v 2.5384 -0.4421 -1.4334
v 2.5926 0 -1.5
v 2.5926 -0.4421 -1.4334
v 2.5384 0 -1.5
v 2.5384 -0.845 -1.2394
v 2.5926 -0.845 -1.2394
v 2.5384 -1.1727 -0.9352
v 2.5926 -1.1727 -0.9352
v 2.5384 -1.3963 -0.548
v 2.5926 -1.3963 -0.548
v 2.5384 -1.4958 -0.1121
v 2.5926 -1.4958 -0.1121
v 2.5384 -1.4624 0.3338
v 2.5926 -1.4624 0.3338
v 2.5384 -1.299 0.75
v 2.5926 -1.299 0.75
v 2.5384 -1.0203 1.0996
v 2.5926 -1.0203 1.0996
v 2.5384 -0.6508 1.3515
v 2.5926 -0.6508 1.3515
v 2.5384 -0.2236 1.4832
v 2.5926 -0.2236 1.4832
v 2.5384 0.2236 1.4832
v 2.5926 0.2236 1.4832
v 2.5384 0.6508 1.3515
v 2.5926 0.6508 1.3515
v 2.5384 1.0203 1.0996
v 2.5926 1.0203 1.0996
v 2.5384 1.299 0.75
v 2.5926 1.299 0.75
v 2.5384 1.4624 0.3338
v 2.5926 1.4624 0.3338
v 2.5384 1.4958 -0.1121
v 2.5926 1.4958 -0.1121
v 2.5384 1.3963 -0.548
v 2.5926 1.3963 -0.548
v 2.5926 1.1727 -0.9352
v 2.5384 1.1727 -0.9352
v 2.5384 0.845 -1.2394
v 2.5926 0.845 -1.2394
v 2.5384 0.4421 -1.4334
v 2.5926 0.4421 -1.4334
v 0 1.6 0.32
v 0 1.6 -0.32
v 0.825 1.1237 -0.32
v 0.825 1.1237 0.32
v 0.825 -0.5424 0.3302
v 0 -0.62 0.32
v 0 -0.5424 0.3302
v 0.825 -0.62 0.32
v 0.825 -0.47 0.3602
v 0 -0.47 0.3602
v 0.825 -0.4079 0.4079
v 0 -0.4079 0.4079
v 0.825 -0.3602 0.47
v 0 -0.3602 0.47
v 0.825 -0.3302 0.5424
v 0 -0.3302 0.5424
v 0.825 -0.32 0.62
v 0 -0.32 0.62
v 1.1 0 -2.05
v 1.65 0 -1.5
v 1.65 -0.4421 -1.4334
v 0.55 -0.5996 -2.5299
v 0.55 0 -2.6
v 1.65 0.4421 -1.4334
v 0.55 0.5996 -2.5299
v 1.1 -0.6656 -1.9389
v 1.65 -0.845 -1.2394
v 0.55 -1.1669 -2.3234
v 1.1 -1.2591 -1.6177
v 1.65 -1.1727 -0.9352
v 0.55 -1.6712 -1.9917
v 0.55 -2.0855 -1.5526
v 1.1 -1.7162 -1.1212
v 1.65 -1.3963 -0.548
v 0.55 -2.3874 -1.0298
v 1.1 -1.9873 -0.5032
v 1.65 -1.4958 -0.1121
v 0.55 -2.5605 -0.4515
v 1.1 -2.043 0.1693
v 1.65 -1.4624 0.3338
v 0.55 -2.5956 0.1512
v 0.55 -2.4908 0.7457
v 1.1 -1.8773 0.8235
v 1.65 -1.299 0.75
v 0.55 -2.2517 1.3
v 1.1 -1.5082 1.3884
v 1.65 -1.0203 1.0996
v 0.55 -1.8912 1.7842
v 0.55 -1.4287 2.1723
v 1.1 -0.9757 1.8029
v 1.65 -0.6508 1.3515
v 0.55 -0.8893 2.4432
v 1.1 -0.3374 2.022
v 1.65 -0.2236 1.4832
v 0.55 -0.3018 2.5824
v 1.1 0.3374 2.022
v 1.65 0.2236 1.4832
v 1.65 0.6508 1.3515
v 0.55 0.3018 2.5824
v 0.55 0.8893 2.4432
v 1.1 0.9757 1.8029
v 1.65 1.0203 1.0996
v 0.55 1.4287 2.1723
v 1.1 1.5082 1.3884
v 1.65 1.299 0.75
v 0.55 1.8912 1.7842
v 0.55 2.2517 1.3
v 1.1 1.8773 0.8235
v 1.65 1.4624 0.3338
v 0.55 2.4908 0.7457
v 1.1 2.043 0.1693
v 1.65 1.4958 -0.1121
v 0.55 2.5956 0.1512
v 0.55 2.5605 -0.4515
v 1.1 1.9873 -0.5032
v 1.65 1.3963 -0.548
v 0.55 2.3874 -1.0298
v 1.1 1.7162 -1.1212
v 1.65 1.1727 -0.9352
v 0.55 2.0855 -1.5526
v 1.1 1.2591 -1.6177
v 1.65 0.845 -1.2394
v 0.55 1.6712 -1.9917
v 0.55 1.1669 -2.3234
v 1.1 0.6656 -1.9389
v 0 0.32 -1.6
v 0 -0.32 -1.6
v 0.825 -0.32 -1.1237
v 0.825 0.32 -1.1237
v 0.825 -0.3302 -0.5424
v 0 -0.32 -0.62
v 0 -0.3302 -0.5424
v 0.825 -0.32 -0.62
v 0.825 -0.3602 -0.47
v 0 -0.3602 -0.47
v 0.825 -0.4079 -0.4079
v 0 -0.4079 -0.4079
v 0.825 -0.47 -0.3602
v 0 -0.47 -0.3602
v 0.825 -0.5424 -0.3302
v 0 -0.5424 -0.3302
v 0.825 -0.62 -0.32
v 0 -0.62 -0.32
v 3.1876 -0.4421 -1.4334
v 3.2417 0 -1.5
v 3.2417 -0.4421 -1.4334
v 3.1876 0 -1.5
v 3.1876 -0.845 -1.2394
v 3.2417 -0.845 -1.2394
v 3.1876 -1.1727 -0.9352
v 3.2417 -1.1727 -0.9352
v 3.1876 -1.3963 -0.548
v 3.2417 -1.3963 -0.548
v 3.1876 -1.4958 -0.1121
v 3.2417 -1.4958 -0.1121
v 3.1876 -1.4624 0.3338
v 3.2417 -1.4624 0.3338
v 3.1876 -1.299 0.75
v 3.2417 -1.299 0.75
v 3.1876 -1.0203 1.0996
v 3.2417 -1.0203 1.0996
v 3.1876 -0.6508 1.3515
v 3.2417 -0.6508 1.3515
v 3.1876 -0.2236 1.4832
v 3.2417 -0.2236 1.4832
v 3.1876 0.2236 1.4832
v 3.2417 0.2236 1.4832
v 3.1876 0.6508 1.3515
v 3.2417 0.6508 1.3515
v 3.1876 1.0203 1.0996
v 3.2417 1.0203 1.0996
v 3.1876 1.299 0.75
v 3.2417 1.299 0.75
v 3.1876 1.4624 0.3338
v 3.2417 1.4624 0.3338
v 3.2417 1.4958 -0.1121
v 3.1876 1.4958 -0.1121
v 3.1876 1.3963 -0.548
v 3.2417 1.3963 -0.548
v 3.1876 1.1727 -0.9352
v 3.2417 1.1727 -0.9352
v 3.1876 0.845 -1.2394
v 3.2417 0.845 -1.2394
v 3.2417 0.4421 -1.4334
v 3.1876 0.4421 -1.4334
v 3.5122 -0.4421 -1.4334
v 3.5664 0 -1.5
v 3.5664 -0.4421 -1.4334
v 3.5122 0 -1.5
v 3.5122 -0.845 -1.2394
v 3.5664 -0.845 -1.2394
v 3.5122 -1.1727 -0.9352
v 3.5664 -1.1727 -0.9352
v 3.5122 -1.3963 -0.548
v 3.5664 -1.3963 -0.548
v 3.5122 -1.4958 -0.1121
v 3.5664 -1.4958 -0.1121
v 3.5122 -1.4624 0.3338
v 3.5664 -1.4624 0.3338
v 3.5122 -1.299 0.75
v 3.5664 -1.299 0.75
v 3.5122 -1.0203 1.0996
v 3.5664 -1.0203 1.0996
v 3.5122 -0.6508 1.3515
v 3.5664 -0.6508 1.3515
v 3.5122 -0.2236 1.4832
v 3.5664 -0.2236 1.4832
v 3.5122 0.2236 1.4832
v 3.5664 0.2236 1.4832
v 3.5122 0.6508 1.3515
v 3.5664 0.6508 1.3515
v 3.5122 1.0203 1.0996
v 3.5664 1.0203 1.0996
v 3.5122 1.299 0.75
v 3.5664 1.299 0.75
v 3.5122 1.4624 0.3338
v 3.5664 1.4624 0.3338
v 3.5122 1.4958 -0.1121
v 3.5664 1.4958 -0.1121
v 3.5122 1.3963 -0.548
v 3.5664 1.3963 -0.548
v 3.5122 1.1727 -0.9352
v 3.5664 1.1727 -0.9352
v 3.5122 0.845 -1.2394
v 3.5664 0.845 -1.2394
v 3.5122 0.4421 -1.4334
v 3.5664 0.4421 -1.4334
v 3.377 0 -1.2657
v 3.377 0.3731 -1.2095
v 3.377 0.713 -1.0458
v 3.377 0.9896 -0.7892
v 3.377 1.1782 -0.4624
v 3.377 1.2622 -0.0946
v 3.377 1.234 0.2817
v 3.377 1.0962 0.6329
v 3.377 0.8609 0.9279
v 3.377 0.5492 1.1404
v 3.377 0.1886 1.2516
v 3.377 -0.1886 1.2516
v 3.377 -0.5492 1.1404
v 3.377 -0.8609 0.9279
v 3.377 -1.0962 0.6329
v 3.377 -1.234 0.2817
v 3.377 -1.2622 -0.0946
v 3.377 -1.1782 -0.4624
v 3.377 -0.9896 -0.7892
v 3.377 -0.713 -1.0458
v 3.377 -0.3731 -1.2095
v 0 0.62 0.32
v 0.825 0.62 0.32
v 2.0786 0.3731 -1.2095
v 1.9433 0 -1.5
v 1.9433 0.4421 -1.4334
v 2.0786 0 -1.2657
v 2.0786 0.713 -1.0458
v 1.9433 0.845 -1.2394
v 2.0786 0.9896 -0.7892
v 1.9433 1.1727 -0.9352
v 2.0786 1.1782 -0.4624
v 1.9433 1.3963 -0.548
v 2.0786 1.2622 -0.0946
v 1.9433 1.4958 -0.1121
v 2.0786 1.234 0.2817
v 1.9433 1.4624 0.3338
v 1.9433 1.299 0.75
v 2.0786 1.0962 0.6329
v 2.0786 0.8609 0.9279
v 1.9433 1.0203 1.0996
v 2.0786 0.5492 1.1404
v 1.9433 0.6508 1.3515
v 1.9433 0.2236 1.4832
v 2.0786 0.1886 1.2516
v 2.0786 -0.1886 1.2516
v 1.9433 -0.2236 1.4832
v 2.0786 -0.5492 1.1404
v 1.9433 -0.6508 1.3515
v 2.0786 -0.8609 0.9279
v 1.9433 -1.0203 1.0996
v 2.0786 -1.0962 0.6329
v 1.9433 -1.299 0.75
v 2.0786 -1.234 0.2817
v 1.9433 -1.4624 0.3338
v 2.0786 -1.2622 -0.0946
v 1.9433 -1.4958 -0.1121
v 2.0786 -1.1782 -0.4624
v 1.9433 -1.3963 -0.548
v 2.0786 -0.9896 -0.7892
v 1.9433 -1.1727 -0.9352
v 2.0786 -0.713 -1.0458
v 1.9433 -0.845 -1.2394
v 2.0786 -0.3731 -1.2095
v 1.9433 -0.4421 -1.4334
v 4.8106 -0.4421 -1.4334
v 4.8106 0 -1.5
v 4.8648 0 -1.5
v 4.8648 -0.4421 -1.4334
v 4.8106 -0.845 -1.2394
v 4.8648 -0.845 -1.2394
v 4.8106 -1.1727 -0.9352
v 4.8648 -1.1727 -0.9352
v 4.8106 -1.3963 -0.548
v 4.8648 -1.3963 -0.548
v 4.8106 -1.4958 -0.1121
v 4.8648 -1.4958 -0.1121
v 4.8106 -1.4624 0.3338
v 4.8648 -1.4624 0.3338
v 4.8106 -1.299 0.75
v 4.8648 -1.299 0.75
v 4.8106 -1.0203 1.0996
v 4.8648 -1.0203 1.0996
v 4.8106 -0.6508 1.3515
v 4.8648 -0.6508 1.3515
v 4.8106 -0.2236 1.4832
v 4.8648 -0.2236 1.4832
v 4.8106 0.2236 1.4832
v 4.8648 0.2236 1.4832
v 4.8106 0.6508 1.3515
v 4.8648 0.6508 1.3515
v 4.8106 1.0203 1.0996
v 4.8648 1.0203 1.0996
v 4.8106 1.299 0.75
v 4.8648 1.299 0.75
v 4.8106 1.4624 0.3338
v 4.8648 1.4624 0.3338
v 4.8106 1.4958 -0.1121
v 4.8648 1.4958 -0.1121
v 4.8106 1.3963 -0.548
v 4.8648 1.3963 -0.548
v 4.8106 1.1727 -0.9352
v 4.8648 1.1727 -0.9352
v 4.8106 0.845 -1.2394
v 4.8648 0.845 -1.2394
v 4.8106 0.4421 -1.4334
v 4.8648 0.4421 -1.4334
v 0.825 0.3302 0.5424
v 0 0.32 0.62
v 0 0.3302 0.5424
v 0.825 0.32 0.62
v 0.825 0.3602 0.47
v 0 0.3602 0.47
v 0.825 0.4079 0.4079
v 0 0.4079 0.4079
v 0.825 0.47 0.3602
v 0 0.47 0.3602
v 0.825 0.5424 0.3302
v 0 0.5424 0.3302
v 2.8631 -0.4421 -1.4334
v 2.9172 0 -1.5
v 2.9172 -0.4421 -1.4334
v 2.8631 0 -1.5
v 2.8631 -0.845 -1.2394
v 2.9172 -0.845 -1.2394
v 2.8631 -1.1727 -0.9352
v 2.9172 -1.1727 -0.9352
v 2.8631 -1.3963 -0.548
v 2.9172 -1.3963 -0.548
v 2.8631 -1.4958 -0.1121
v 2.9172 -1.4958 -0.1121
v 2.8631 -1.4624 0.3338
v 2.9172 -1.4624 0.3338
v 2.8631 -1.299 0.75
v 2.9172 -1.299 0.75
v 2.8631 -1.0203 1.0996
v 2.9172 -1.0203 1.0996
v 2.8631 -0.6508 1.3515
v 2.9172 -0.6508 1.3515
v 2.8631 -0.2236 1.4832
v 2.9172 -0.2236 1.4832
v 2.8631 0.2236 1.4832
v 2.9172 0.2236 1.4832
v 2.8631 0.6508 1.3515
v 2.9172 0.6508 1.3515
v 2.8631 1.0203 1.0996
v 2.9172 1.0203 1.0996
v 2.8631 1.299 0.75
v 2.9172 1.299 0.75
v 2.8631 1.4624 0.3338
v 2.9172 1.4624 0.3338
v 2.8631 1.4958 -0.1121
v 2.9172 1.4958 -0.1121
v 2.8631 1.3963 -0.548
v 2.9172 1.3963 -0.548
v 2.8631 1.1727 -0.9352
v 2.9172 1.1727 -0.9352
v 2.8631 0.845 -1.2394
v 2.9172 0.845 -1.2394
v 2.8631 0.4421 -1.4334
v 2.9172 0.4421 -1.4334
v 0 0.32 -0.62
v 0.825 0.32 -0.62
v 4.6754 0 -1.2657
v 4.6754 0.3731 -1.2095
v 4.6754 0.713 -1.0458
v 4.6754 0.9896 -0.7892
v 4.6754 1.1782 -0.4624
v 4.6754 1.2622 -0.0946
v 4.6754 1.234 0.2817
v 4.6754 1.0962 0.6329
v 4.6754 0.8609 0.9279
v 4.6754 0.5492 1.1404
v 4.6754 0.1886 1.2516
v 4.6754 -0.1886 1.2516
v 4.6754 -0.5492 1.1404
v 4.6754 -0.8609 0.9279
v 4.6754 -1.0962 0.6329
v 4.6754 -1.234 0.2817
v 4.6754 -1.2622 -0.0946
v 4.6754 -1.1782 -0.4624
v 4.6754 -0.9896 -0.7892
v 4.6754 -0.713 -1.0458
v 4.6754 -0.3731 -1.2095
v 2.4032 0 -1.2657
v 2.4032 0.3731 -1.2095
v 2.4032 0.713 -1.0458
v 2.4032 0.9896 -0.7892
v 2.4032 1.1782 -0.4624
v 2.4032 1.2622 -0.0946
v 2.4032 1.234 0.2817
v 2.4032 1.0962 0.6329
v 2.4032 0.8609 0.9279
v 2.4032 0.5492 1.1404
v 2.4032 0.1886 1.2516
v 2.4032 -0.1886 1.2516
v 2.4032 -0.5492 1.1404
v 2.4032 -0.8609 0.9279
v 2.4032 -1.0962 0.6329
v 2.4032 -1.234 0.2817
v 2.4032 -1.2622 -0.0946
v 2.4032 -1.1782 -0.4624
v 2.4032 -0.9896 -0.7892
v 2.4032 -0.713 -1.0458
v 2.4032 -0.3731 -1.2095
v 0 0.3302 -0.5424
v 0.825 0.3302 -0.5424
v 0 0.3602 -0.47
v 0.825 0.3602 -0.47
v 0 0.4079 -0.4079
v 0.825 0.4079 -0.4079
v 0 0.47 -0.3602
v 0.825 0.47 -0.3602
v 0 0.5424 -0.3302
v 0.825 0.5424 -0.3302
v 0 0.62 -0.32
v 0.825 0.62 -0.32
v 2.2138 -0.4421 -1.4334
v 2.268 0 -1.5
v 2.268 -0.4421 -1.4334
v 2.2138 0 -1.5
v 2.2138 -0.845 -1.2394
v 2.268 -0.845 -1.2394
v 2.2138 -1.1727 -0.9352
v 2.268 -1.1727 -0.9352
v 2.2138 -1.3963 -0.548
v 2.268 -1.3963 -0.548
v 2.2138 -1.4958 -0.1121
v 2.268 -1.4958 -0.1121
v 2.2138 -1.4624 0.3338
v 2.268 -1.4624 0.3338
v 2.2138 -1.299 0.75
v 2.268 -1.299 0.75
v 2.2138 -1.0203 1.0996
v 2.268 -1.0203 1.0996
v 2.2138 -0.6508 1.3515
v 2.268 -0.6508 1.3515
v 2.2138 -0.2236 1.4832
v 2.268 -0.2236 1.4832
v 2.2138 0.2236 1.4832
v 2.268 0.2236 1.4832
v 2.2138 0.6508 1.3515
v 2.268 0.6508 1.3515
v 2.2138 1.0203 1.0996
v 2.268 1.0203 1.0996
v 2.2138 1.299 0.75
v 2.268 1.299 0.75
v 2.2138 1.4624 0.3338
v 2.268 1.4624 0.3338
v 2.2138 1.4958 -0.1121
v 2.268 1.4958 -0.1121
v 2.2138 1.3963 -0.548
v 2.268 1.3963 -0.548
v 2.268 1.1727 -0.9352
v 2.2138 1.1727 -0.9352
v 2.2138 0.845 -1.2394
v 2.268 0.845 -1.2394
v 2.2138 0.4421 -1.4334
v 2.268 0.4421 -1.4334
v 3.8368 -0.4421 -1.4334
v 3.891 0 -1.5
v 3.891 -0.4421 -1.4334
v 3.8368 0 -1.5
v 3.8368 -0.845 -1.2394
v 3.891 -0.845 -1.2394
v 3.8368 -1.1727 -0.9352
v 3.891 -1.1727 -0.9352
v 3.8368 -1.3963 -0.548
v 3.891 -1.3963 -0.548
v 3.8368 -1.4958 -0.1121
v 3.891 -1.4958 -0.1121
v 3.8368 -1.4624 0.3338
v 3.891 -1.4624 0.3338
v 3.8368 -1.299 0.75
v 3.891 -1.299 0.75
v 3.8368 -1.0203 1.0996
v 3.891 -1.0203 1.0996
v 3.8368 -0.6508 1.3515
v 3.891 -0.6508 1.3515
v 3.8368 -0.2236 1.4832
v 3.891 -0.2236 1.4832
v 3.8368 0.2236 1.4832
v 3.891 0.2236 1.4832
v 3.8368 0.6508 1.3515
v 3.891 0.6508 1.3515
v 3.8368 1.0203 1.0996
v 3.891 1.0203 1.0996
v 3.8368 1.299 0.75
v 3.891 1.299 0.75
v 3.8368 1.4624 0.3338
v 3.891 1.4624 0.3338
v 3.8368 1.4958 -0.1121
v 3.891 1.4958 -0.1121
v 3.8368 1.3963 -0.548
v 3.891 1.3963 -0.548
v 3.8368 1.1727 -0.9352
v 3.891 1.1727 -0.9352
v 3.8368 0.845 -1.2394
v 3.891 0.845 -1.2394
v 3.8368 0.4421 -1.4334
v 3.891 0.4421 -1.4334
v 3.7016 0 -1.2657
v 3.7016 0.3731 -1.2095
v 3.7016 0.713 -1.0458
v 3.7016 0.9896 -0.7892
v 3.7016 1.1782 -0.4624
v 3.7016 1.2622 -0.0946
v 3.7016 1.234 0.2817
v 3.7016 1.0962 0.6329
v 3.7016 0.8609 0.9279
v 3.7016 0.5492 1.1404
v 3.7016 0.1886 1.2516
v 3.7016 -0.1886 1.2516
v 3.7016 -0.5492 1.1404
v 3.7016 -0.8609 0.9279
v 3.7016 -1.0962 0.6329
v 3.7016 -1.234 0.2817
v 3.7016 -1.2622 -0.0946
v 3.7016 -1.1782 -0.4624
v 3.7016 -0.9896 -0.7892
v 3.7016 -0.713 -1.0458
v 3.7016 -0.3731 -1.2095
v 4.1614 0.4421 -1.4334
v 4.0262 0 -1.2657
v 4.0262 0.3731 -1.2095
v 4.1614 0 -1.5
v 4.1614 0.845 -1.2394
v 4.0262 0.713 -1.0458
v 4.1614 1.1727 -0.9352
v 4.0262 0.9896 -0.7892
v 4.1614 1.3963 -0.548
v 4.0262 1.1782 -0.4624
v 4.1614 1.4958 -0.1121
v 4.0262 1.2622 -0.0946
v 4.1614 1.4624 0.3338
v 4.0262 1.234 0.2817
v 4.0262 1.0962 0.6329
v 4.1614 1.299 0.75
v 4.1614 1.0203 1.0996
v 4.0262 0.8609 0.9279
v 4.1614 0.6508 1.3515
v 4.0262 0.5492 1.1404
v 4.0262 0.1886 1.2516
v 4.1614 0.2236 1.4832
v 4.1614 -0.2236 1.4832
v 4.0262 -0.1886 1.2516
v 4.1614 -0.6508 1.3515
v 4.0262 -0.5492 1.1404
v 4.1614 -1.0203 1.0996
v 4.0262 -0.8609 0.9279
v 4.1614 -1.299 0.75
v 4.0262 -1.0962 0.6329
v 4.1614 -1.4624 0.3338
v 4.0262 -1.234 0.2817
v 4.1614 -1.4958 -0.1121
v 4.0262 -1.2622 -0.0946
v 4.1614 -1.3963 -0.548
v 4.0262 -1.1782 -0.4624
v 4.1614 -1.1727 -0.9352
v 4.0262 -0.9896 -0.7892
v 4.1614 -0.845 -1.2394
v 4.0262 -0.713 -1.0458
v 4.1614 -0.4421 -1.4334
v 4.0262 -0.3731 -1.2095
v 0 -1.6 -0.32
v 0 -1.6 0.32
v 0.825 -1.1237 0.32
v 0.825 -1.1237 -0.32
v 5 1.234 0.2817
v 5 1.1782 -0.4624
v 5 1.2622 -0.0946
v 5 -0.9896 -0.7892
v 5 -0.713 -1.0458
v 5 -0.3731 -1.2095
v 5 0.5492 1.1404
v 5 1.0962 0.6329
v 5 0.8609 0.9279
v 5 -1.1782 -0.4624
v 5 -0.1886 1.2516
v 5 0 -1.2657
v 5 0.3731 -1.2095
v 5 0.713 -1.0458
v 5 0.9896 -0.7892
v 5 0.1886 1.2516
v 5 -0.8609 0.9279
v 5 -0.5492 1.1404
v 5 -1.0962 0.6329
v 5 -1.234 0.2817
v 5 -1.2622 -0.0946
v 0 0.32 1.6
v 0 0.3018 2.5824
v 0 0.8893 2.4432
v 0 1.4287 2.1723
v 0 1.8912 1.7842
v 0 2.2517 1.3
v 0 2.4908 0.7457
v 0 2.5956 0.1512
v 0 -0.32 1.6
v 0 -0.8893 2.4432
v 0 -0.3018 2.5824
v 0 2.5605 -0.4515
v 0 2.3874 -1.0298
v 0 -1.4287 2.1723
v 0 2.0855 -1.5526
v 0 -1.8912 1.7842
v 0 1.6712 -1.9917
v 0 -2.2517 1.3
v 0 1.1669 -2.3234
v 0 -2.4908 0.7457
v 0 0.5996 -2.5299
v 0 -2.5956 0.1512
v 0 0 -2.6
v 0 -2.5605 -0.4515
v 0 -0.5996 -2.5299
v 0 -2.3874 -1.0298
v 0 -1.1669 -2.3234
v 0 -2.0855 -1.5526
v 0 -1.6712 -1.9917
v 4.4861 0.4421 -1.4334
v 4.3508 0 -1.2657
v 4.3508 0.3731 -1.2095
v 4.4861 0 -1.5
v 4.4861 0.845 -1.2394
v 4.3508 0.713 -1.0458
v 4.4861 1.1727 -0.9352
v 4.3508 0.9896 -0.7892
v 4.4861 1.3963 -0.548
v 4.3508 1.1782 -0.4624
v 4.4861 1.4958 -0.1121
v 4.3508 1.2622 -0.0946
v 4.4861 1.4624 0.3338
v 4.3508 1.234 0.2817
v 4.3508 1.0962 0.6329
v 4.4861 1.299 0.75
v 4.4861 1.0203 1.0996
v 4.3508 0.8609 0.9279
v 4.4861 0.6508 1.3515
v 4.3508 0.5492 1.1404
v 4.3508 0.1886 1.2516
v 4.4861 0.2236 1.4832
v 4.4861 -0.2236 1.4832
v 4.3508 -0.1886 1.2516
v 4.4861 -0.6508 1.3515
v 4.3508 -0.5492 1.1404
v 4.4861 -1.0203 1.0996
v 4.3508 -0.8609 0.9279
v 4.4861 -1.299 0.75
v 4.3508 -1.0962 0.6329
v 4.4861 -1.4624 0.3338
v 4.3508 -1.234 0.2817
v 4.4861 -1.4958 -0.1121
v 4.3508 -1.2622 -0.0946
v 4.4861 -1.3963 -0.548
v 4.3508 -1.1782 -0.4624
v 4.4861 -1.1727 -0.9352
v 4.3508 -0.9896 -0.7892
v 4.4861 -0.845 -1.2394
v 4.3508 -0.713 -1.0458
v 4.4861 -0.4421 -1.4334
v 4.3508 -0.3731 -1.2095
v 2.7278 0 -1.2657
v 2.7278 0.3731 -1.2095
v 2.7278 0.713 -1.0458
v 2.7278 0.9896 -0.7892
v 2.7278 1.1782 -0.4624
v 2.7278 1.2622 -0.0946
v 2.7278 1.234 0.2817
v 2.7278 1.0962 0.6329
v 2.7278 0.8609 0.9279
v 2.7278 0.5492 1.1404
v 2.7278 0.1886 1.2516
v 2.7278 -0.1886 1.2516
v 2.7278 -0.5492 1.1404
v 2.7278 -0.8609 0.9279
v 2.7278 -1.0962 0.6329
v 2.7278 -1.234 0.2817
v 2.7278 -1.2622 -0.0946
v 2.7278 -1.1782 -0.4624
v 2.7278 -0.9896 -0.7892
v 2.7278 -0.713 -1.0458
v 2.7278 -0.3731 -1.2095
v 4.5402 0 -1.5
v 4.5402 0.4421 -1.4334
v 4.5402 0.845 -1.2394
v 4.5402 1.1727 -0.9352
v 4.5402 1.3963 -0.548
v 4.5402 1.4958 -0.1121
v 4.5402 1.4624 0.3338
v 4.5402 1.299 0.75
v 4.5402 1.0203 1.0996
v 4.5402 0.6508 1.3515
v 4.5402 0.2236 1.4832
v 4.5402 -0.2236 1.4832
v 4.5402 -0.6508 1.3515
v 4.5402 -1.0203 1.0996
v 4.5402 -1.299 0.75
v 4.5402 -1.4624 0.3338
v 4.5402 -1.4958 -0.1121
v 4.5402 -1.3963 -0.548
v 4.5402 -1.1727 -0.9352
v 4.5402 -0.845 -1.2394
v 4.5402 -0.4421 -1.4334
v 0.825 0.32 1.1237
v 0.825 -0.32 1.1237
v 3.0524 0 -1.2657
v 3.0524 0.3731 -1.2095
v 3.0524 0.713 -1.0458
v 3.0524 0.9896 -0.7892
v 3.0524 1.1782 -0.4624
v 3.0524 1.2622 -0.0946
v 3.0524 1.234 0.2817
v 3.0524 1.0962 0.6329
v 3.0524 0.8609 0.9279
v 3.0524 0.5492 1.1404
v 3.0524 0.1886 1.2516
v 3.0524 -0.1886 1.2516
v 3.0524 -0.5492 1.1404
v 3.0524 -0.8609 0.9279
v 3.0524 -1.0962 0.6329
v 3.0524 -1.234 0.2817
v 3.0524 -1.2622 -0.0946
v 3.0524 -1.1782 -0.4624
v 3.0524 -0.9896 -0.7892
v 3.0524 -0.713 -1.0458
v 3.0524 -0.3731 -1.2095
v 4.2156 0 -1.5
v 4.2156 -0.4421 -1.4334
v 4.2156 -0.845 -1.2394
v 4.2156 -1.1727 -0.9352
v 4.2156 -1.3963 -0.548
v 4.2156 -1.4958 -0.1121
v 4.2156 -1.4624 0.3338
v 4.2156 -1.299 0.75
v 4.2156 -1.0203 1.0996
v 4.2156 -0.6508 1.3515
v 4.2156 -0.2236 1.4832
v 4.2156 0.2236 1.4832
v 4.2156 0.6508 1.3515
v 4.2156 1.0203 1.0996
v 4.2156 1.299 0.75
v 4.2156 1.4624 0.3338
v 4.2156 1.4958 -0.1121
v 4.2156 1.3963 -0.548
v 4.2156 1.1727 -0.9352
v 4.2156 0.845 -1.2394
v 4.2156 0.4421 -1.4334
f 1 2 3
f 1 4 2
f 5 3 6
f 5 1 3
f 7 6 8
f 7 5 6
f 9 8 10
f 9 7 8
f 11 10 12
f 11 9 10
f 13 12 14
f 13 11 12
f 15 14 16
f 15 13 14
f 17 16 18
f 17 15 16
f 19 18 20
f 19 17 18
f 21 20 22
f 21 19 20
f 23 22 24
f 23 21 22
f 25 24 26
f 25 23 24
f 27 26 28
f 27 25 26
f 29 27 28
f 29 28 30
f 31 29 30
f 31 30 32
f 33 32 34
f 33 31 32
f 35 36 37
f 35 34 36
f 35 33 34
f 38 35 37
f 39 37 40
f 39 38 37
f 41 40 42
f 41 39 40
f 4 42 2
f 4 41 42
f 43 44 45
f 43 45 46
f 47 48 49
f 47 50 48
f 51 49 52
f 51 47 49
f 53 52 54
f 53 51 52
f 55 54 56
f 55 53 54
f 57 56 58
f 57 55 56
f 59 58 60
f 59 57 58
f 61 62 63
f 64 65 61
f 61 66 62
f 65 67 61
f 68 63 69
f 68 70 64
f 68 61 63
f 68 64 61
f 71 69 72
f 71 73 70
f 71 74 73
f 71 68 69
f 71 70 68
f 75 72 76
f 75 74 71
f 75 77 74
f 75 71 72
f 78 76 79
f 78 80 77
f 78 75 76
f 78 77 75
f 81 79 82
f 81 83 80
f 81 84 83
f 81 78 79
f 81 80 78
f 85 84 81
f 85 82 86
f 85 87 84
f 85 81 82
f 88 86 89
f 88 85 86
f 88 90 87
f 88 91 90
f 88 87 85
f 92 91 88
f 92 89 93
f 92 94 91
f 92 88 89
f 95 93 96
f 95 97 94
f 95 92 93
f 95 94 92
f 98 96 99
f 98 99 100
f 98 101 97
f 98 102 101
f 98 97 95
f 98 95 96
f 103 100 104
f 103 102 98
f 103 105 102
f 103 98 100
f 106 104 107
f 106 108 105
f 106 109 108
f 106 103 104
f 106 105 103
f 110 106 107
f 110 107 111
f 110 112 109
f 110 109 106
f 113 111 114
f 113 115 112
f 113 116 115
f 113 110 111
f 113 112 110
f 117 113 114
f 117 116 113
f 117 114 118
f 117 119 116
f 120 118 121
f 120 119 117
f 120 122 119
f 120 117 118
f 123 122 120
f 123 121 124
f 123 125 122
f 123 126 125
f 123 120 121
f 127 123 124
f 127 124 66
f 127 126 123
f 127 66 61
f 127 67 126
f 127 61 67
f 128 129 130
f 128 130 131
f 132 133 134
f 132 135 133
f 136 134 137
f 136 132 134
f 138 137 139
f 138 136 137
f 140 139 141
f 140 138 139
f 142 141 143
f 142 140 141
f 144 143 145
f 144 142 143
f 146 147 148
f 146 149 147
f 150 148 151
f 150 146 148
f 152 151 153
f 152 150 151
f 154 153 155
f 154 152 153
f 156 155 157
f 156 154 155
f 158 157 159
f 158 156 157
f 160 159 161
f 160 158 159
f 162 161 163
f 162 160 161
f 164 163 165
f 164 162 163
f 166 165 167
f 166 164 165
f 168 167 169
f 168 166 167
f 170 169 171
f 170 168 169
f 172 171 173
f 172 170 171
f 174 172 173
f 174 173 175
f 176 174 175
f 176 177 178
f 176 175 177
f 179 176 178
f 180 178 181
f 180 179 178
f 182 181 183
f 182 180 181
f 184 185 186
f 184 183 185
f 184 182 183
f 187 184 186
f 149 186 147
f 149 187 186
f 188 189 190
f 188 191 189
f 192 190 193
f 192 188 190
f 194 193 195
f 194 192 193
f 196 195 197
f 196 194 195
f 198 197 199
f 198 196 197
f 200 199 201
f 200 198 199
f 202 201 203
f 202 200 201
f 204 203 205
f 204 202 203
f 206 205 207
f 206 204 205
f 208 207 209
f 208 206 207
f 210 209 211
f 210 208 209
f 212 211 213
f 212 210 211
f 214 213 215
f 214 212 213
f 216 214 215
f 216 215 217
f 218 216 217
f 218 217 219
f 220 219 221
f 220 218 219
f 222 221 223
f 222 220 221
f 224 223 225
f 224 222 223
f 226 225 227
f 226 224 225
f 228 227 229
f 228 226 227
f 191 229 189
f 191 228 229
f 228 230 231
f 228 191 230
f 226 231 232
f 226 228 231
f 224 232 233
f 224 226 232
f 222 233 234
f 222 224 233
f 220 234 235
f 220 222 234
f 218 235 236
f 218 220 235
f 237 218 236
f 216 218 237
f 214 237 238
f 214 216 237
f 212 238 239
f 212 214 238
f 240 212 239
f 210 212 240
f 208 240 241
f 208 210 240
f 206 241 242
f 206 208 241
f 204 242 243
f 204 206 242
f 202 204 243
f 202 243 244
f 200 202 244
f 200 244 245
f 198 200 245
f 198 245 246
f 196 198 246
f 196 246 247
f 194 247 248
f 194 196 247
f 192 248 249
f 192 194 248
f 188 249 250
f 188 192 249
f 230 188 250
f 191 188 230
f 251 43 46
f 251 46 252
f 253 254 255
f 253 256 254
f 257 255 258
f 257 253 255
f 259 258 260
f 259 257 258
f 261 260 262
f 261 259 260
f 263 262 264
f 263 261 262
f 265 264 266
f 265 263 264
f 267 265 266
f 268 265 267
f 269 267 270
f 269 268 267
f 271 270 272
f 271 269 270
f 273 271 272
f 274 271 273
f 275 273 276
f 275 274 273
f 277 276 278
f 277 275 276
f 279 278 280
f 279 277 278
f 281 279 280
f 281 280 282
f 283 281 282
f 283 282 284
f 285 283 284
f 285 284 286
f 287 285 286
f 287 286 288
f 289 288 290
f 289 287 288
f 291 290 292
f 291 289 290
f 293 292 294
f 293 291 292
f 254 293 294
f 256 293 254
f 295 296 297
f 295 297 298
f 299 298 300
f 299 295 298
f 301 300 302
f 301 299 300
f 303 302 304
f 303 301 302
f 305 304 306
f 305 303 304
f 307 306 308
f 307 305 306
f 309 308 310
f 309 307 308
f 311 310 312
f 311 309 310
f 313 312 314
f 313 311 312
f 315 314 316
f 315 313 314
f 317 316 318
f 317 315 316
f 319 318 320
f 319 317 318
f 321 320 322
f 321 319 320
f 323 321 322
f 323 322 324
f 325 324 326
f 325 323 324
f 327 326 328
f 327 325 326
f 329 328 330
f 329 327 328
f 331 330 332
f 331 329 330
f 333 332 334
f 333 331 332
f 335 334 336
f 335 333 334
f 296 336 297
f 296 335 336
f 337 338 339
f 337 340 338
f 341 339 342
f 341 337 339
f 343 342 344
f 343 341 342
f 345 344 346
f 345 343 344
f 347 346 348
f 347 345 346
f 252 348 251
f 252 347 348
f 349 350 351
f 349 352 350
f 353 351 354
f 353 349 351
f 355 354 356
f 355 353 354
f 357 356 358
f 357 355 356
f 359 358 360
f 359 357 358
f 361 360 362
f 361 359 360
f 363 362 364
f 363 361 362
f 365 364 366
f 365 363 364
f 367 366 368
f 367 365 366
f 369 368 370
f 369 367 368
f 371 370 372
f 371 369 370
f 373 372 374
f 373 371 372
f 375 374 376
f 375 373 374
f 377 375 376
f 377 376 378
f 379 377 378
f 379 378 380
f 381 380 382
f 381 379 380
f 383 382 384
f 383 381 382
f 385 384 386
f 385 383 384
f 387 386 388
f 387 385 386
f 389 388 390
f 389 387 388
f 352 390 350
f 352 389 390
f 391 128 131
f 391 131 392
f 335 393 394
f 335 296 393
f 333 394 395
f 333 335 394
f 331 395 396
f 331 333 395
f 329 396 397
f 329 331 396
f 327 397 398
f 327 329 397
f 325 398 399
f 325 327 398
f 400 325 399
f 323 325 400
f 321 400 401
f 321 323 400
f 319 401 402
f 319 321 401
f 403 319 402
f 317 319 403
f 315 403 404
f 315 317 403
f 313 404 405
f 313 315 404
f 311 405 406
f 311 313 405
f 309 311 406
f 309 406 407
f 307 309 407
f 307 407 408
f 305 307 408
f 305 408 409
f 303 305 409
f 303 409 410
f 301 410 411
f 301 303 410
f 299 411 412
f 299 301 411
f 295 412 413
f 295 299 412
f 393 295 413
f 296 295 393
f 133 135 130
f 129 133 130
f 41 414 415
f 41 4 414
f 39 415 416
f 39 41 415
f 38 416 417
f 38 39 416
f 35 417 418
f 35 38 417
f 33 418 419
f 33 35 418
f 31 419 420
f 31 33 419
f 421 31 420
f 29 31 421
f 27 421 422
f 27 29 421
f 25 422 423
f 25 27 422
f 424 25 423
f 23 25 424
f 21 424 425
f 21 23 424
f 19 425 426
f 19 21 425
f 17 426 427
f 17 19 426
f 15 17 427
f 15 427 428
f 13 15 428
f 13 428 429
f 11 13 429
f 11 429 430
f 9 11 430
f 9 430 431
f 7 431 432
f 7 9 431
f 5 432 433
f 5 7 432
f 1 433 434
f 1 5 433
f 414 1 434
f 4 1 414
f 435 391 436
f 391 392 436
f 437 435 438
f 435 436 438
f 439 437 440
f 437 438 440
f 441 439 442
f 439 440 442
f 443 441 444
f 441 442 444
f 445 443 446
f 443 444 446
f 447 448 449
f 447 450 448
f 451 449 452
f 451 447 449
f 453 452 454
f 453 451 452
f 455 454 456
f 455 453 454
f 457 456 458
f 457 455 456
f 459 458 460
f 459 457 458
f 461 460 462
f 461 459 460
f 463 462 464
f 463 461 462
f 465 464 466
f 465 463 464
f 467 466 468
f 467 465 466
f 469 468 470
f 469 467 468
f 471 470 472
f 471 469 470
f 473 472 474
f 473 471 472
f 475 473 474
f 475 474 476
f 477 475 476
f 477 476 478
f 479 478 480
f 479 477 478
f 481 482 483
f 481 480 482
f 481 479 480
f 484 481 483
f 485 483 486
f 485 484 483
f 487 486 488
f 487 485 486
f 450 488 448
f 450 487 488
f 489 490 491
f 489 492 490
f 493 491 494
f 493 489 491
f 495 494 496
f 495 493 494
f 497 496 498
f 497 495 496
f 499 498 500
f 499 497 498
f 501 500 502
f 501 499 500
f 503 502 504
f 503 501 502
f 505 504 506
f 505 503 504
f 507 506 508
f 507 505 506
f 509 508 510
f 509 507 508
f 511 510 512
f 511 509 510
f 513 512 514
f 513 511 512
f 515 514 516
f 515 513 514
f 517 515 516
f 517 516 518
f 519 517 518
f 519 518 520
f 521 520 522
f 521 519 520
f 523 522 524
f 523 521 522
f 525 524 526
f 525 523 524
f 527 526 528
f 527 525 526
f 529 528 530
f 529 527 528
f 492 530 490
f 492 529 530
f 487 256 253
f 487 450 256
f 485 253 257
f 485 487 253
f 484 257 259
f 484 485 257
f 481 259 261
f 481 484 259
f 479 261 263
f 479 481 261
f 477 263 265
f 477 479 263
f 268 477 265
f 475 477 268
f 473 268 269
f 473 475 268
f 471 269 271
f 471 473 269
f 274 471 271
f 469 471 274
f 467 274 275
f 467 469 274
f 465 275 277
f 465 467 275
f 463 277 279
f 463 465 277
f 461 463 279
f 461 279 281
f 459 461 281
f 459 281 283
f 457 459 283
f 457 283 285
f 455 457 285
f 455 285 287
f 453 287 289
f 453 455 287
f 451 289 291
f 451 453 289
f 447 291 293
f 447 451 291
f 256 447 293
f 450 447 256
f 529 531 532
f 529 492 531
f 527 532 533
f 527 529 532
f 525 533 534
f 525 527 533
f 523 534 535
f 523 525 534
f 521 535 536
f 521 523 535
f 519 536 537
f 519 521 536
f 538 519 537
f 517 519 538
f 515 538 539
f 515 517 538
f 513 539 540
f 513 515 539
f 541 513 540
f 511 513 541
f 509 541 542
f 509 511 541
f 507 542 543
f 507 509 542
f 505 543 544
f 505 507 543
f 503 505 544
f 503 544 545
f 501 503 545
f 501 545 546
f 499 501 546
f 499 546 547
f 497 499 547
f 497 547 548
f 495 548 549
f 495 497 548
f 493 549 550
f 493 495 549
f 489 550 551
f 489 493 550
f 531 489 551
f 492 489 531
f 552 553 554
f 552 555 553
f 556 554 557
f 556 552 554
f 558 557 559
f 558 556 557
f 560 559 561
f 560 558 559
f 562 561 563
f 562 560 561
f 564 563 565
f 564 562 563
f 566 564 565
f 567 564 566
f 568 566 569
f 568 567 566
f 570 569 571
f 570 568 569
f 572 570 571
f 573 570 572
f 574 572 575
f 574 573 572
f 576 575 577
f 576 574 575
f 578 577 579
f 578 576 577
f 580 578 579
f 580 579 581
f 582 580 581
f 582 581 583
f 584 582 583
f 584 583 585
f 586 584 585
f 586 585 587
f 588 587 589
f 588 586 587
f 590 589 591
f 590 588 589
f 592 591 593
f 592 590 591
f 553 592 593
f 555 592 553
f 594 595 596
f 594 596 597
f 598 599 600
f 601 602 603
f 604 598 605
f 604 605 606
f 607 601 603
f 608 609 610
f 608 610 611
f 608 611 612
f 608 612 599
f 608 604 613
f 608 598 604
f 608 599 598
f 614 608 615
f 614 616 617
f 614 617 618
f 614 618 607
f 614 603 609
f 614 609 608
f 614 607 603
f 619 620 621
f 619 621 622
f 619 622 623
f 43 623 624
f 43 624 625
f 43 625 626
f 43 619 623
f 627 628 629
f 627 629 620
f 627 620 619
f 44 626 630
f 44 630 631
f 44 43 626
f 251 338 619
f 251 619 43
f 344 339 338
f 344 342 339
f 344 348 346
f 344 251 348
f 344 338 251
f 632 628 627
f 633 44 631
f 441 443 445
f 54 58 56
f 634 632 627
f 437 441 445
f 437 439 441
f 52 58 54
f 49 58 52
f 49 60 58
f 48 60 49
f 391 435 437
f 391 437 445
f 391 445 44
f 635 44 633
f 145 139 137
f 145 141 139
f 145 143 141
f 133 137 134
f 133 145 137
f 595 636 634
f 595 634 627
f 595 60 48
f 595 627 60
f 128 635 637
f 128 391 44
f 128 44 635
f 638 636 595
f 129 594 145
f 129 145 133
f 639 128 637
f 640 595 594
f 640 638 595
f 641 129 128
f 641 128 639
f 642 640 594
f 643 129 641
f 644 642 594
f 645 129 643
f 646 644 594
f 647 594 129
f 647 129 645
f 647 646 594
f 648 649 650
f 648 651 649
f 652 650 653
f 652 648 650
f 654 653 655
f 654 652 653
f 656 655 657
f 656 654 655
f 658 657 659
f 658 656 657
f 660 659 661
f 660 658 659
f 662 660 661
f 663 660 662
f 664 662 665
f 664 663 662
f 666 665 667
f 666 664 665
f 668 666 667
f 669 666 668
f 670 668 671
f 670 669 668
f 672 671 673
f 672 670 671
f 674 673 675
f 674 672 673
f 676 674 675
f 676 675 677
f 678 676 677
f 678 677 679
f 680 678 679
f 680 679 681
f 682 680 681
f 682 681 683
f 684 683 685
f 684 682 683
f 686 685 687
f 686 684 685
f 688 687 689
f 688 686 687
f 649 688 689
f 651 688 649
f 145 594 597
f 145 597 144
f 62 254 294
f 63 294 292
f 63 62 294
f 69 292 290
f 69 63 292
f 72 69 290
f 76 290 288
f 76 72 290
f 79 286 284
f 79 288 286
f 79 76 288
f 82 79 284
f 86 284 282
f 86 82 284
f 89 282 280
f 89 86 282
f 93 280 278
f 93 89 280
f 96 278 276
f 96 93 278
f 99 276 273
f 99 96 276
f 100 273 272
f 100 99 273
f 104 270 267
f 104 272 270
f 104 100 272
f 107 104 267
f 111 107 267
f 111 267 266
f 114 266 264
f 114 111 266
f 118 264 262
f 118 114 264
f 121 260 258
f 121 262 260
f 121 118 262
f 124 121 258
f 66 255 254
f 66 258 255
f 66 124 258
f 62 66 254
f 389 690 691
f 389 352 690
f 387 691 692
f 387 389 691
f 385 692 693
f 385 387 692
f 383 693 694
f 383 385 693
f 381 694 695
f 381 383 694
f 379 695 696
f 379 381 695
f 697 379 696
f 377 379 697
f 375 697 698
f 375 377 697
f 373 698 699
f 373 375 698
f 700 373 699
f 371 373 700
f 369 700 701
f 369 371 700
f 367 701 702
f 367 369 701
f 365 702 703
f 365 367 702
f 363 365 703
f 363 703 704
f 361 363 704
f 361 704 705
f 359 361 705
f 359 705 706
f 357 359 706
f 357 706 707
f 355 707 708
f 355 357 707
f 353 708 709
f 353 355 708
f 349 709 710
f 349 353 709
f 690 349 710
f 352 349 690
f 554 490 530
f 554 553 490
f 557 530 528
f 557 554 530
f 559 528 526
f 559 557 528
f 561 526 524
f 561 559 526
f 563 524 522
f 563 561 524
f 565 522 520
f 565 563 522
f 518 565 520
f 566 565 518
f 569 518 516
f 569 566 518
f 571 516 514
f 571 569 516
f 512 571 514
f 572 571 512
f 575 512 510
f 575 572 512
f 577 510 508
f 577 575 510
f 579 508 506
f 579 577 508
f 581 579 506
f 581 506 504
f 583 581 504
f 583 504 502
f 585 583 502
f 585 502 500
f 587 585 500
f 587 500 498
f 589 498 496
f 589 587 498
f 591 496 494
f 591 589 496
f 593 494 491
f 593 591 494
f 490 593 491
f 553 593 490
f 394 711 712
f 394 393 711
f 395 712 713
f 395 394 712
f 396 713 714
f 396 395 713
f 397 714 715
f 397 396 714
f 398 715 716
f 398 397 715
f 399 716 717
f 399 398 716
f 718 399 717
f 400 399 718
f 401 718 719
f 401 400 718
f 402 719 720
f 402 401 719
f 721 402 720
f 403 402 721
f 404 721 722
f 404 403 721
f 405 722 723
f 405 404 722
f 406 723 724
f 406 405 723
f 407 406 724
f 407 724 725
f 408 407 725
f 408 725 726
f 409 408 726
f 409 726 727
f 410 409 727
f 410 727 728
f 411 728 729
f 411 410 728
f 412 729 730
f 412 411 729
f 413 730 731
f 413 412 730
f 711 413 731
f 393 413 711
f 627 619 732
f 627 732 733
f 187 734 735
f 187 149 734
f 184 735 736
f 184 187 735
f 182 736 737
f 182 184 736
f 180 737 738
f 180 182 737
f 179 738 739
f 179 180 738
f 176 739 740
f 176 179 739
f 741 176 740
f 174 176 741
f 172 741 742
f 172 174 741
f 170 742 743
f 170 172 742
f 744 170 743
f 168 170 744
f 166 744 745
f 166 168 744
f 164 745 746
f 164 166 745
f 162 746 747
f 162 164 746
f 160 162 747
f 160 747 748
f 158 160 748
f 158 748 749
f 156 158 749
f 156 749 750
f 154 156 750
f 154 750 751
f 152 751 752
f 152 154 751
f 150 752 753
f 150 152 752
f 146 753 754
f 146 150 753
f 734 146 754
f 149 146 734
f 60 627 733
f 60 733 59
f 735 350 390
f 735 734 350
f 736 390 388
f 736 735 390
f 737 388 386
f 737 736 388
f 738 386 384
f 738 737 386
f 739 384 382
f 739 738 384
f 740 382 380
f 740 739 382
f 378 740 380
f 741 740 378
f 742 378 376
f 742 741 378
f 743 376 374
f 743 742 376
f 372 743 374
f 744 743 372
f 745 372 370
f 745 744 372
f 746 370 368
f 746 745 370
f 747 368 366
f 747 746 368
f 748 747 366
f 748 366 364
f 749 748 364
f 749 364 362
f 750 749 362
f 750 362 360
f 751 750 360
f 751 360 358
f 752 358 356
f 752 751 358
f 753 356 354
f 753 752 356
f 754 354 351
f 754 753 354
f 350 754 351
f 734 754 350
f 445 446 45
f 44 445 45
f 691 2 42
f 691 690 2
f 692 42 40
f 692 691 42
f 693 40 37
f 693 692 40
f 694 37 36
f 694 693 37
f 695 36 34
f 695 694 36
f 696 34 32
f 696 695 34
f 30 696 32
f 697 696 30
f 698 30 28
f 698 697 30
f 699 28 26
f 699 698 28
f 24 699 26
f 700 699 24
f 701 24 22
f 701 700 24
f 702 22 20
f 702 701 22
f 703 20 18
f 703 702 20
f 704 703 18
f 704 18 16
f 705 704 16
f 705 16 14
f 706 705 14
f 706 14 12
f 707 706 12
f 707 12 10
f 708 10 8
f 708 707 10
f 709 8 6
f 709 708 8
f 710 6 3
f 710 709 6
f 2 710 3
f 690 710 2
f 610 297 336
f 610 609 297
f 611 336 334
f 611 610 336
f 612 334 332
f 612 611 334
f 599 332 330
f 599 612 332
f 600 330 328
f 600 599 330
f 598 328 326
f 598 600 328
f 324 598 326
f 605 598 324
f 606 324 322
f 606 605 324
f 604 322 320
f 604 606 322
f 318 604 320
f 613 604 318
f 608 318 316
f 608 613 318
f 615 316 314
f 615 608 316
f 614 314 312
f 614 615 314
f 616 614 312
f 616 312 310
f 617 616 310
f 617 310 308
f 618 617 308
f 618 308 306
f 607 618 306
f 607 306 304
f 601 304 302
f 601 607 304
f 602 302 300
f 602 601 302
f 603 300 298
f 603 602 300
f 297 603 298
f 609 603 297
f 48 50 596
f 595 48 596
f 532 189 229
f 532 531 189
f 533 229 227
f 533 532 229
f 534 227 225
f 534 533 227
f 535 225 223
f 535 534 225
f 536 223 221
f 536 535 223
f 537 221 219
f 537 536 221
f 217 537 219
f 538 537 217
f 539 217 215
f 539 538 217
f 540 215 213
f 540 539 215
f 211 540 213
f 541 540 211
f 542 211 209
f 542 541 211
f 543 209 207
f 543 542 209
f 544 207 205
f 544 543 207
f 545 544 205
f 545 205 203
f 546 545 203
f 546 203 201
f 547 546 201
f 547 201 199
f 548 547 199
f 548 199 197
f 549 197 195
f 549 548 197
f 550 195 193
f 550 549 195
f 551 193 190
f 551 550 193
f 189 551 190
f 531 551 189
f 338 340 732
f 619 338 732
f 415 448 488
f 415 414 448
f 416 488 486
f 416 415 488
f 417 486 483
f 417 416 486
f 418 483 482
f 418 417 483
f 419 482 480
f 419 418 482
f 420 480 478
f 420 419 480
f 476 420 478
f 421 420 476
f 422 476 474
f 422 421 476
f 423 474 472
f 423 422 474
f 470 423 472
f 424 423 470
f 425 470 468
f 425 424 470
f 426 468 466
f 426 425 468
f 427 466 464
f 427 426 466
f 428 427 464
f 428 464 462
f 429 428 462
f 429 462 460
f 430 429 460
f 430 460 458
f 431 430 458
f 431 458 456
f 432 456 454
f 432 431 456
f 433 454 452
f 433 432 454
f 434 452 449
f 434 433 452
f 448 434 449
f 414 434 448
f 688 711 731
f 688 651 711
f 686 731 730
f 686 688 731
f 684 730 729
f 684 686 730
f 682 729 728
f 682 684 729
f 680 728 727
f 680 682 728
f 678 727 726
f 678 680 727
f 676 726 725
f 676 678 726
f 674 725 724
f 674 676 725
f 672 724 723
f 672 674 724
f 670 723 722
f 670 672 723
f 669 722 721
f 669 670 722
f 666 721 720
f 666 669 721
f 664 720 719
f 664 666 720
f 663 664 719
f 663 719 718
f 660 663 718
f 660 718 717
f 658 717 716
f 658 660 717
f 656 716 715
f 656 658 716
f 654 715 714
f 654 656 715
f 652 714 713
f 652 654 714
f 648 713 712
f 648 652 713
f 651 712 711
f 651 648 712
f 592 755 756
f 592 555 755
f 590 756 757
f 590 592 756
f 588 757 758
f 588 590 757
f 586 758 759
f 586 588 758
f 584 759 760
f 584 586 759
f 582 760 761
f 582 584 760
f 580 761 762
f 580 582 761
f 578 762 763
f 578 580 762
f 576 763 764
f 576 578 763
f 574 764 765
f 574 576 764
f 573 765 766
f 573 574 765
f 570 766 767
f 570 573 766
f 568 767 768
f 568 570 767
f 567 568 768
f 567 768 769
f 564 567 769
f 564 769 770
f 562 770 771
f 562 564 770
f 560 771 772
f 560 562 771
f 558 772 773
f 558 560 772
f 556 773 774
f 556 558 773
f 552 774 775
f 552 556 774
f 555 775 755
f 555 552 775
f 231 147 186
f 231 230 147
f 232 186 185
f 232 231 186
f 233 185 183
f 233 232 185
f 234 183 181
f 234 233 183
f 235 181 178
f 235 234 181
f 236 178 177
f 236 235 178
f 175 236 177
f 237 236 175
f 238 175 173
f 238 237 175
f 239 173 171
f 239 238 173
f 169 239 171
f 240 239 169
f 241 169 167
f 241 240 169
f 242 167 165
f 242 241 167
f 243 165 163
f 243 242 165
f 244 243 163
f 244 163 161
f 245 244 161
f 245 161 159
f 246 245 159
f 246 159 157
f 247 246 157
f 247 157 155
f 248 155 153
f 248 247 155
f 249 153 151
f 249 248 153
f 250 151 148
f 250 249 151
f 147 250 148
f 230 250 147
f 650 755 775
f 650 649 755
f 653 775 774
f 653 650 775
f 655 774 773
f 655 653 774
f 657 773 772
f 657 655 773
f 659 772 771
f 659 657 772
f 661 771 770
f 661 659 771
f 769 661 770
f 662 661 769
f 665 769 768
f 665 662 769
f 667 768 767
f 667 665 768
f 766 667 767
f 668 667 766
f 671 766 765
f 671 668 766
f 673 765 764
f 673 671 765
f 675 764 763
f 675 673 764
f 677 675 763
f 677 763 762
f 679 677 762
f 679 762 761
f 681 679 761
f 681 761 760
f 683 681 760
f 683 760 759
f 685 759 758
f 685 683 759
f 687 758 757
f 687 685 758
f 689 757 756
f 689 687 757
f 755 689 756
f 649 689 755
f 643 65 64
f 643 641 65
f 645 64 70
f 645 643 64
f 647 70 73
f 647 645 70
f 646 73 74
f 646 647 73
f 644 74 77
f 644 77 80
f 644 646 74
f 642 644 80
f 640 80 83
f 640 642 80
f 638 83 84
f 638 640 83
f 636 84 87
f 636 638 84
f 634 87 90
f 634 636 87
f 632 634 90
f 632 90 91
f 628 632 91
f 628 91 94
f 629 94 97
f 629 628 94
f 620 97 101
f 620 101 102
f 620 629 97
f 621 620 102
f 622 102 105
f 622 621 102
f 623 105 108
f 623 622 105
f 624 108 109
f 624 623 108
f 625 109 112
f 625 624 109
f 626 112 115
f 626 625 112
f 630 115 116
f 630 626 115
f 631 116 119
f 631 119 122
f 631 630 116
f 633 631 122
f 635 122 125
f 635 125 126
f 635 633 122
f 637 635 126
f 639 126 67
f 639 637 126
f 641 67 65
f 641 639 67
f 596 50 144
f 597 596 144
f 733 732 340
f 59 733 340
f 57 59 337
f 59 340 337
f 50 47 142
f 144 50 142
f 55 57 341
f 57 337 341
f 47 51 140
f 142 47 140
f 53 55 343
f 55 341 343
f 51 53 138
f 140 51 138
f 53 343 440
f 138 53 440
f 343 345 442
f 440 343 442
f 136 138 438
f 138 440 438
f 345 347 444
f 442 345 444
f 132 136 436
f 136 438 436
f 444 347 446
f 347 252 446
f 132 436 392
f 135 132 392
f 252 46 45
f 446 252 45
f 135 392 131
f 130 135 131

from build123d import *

# Parameters (mm, degrees)
CROSSRECESS_DEPTH = 0.825
DRAFT9_ANGLE      = 30
FILLET5_R         = 0.3
LPATTERN10_COUNT  = 10
LPATTERN10_PITCH  = 0.3246


with BuildPart() as part:
    # Sketch1 → Base (revolve)
    with BuildSketch(Plane.XY, mode=Mode.PRIVATE) as base_sk:
        Polygon((5, 1.5), (2.65, 1.5), (1.65, 1.5), (0.55, 2.6), (0, 2.6), (0, 0), (5, 0), align=None)
    revolve(base_sk.sketch.rotate(Axis((4.515812911, 0, 0), (-1, 0, 0)), 90), axis=Axis((4.515812911, 0, 0), (-1, 0, 0)))

    # Sketch6 → CrossRecess (cut)
    with BuildSketch(Plane(origin=(0, 0, 0), x_dir=(0, 0, -1), z_dir=(1, 0, 0))):
        Polygon((0.32, 0.32), (0.32, 1.6), (-0.32, 1.6), (-0.32, 0.32), (-1.6, 0.32), (-1.6, -0.32), (-0.32, -0.32), (-0.32, -1.6), (0.32, -1.6), (0.32, -0.32), (1.6, -0.32), (1.6, 0.32), align=None)
    extrude(amount=CROSSRECESS_DEPTH, mode=Mode.SUBTRACT)

    # Draft9
    draft9_faces = [part.faces().sort_by_distance(p)[0] for p in [
        (0.4125, 1.6, 0),
        (0.4125, 0, 1.6),
        (0.4125, -1.6, 0),
        (0.4125, 0, -1.6),
    ]]
    draft(draft9_faces, Plane(origin=(0, 2.6, 0), x_dir=(0, 0, -1), z_dir=(-1, 0, 0)), DRAFT9_ANGLE)

    # Fillet5
    fillet5_edges = [part.edges().sort_by_distance(p)[0] for p in [
        (0.4125, 0.32, 0.32),
        (0.4125, -0.32, 0.32),
        (0.4125, -0.32, -0.32),
        (0.4125, 0.32, -0.32),
    ]]
    fillet(fillet5_edges, radius=FILLET5_R)

    # Sketch9 → Cut-Revolve10 (revolve, cut)
    with BuildSketch(Plane.XY, mode=Mode.PRIVATE) as cut_revolve10_sk:
        Polygon((5, 1.265740128), (5.13525, 1.5), (5.13525, 1.7705), (4.86475, 1.7705), (4.86475, 1.5), align=None)
    cut_revolve10 = revolve(cut_revolve10_sk.sketch.rotate(Axis((0, 0, 0), (1, 0, 0)), 270), axis=Axis((0, 0, 0), (1, 0, 0)), mode=Mode.SUBTRACT)

    # LPattern10: Cut-Revolve10 ×10
    with Locations(*[(-i * LPATTERN10_PITCH, 0, 0) for i in range(1, LPATTERN10_COUNT)]):
        add(cut_revolve10, mode=Mode.SUBTRACT)


solid = part.part
